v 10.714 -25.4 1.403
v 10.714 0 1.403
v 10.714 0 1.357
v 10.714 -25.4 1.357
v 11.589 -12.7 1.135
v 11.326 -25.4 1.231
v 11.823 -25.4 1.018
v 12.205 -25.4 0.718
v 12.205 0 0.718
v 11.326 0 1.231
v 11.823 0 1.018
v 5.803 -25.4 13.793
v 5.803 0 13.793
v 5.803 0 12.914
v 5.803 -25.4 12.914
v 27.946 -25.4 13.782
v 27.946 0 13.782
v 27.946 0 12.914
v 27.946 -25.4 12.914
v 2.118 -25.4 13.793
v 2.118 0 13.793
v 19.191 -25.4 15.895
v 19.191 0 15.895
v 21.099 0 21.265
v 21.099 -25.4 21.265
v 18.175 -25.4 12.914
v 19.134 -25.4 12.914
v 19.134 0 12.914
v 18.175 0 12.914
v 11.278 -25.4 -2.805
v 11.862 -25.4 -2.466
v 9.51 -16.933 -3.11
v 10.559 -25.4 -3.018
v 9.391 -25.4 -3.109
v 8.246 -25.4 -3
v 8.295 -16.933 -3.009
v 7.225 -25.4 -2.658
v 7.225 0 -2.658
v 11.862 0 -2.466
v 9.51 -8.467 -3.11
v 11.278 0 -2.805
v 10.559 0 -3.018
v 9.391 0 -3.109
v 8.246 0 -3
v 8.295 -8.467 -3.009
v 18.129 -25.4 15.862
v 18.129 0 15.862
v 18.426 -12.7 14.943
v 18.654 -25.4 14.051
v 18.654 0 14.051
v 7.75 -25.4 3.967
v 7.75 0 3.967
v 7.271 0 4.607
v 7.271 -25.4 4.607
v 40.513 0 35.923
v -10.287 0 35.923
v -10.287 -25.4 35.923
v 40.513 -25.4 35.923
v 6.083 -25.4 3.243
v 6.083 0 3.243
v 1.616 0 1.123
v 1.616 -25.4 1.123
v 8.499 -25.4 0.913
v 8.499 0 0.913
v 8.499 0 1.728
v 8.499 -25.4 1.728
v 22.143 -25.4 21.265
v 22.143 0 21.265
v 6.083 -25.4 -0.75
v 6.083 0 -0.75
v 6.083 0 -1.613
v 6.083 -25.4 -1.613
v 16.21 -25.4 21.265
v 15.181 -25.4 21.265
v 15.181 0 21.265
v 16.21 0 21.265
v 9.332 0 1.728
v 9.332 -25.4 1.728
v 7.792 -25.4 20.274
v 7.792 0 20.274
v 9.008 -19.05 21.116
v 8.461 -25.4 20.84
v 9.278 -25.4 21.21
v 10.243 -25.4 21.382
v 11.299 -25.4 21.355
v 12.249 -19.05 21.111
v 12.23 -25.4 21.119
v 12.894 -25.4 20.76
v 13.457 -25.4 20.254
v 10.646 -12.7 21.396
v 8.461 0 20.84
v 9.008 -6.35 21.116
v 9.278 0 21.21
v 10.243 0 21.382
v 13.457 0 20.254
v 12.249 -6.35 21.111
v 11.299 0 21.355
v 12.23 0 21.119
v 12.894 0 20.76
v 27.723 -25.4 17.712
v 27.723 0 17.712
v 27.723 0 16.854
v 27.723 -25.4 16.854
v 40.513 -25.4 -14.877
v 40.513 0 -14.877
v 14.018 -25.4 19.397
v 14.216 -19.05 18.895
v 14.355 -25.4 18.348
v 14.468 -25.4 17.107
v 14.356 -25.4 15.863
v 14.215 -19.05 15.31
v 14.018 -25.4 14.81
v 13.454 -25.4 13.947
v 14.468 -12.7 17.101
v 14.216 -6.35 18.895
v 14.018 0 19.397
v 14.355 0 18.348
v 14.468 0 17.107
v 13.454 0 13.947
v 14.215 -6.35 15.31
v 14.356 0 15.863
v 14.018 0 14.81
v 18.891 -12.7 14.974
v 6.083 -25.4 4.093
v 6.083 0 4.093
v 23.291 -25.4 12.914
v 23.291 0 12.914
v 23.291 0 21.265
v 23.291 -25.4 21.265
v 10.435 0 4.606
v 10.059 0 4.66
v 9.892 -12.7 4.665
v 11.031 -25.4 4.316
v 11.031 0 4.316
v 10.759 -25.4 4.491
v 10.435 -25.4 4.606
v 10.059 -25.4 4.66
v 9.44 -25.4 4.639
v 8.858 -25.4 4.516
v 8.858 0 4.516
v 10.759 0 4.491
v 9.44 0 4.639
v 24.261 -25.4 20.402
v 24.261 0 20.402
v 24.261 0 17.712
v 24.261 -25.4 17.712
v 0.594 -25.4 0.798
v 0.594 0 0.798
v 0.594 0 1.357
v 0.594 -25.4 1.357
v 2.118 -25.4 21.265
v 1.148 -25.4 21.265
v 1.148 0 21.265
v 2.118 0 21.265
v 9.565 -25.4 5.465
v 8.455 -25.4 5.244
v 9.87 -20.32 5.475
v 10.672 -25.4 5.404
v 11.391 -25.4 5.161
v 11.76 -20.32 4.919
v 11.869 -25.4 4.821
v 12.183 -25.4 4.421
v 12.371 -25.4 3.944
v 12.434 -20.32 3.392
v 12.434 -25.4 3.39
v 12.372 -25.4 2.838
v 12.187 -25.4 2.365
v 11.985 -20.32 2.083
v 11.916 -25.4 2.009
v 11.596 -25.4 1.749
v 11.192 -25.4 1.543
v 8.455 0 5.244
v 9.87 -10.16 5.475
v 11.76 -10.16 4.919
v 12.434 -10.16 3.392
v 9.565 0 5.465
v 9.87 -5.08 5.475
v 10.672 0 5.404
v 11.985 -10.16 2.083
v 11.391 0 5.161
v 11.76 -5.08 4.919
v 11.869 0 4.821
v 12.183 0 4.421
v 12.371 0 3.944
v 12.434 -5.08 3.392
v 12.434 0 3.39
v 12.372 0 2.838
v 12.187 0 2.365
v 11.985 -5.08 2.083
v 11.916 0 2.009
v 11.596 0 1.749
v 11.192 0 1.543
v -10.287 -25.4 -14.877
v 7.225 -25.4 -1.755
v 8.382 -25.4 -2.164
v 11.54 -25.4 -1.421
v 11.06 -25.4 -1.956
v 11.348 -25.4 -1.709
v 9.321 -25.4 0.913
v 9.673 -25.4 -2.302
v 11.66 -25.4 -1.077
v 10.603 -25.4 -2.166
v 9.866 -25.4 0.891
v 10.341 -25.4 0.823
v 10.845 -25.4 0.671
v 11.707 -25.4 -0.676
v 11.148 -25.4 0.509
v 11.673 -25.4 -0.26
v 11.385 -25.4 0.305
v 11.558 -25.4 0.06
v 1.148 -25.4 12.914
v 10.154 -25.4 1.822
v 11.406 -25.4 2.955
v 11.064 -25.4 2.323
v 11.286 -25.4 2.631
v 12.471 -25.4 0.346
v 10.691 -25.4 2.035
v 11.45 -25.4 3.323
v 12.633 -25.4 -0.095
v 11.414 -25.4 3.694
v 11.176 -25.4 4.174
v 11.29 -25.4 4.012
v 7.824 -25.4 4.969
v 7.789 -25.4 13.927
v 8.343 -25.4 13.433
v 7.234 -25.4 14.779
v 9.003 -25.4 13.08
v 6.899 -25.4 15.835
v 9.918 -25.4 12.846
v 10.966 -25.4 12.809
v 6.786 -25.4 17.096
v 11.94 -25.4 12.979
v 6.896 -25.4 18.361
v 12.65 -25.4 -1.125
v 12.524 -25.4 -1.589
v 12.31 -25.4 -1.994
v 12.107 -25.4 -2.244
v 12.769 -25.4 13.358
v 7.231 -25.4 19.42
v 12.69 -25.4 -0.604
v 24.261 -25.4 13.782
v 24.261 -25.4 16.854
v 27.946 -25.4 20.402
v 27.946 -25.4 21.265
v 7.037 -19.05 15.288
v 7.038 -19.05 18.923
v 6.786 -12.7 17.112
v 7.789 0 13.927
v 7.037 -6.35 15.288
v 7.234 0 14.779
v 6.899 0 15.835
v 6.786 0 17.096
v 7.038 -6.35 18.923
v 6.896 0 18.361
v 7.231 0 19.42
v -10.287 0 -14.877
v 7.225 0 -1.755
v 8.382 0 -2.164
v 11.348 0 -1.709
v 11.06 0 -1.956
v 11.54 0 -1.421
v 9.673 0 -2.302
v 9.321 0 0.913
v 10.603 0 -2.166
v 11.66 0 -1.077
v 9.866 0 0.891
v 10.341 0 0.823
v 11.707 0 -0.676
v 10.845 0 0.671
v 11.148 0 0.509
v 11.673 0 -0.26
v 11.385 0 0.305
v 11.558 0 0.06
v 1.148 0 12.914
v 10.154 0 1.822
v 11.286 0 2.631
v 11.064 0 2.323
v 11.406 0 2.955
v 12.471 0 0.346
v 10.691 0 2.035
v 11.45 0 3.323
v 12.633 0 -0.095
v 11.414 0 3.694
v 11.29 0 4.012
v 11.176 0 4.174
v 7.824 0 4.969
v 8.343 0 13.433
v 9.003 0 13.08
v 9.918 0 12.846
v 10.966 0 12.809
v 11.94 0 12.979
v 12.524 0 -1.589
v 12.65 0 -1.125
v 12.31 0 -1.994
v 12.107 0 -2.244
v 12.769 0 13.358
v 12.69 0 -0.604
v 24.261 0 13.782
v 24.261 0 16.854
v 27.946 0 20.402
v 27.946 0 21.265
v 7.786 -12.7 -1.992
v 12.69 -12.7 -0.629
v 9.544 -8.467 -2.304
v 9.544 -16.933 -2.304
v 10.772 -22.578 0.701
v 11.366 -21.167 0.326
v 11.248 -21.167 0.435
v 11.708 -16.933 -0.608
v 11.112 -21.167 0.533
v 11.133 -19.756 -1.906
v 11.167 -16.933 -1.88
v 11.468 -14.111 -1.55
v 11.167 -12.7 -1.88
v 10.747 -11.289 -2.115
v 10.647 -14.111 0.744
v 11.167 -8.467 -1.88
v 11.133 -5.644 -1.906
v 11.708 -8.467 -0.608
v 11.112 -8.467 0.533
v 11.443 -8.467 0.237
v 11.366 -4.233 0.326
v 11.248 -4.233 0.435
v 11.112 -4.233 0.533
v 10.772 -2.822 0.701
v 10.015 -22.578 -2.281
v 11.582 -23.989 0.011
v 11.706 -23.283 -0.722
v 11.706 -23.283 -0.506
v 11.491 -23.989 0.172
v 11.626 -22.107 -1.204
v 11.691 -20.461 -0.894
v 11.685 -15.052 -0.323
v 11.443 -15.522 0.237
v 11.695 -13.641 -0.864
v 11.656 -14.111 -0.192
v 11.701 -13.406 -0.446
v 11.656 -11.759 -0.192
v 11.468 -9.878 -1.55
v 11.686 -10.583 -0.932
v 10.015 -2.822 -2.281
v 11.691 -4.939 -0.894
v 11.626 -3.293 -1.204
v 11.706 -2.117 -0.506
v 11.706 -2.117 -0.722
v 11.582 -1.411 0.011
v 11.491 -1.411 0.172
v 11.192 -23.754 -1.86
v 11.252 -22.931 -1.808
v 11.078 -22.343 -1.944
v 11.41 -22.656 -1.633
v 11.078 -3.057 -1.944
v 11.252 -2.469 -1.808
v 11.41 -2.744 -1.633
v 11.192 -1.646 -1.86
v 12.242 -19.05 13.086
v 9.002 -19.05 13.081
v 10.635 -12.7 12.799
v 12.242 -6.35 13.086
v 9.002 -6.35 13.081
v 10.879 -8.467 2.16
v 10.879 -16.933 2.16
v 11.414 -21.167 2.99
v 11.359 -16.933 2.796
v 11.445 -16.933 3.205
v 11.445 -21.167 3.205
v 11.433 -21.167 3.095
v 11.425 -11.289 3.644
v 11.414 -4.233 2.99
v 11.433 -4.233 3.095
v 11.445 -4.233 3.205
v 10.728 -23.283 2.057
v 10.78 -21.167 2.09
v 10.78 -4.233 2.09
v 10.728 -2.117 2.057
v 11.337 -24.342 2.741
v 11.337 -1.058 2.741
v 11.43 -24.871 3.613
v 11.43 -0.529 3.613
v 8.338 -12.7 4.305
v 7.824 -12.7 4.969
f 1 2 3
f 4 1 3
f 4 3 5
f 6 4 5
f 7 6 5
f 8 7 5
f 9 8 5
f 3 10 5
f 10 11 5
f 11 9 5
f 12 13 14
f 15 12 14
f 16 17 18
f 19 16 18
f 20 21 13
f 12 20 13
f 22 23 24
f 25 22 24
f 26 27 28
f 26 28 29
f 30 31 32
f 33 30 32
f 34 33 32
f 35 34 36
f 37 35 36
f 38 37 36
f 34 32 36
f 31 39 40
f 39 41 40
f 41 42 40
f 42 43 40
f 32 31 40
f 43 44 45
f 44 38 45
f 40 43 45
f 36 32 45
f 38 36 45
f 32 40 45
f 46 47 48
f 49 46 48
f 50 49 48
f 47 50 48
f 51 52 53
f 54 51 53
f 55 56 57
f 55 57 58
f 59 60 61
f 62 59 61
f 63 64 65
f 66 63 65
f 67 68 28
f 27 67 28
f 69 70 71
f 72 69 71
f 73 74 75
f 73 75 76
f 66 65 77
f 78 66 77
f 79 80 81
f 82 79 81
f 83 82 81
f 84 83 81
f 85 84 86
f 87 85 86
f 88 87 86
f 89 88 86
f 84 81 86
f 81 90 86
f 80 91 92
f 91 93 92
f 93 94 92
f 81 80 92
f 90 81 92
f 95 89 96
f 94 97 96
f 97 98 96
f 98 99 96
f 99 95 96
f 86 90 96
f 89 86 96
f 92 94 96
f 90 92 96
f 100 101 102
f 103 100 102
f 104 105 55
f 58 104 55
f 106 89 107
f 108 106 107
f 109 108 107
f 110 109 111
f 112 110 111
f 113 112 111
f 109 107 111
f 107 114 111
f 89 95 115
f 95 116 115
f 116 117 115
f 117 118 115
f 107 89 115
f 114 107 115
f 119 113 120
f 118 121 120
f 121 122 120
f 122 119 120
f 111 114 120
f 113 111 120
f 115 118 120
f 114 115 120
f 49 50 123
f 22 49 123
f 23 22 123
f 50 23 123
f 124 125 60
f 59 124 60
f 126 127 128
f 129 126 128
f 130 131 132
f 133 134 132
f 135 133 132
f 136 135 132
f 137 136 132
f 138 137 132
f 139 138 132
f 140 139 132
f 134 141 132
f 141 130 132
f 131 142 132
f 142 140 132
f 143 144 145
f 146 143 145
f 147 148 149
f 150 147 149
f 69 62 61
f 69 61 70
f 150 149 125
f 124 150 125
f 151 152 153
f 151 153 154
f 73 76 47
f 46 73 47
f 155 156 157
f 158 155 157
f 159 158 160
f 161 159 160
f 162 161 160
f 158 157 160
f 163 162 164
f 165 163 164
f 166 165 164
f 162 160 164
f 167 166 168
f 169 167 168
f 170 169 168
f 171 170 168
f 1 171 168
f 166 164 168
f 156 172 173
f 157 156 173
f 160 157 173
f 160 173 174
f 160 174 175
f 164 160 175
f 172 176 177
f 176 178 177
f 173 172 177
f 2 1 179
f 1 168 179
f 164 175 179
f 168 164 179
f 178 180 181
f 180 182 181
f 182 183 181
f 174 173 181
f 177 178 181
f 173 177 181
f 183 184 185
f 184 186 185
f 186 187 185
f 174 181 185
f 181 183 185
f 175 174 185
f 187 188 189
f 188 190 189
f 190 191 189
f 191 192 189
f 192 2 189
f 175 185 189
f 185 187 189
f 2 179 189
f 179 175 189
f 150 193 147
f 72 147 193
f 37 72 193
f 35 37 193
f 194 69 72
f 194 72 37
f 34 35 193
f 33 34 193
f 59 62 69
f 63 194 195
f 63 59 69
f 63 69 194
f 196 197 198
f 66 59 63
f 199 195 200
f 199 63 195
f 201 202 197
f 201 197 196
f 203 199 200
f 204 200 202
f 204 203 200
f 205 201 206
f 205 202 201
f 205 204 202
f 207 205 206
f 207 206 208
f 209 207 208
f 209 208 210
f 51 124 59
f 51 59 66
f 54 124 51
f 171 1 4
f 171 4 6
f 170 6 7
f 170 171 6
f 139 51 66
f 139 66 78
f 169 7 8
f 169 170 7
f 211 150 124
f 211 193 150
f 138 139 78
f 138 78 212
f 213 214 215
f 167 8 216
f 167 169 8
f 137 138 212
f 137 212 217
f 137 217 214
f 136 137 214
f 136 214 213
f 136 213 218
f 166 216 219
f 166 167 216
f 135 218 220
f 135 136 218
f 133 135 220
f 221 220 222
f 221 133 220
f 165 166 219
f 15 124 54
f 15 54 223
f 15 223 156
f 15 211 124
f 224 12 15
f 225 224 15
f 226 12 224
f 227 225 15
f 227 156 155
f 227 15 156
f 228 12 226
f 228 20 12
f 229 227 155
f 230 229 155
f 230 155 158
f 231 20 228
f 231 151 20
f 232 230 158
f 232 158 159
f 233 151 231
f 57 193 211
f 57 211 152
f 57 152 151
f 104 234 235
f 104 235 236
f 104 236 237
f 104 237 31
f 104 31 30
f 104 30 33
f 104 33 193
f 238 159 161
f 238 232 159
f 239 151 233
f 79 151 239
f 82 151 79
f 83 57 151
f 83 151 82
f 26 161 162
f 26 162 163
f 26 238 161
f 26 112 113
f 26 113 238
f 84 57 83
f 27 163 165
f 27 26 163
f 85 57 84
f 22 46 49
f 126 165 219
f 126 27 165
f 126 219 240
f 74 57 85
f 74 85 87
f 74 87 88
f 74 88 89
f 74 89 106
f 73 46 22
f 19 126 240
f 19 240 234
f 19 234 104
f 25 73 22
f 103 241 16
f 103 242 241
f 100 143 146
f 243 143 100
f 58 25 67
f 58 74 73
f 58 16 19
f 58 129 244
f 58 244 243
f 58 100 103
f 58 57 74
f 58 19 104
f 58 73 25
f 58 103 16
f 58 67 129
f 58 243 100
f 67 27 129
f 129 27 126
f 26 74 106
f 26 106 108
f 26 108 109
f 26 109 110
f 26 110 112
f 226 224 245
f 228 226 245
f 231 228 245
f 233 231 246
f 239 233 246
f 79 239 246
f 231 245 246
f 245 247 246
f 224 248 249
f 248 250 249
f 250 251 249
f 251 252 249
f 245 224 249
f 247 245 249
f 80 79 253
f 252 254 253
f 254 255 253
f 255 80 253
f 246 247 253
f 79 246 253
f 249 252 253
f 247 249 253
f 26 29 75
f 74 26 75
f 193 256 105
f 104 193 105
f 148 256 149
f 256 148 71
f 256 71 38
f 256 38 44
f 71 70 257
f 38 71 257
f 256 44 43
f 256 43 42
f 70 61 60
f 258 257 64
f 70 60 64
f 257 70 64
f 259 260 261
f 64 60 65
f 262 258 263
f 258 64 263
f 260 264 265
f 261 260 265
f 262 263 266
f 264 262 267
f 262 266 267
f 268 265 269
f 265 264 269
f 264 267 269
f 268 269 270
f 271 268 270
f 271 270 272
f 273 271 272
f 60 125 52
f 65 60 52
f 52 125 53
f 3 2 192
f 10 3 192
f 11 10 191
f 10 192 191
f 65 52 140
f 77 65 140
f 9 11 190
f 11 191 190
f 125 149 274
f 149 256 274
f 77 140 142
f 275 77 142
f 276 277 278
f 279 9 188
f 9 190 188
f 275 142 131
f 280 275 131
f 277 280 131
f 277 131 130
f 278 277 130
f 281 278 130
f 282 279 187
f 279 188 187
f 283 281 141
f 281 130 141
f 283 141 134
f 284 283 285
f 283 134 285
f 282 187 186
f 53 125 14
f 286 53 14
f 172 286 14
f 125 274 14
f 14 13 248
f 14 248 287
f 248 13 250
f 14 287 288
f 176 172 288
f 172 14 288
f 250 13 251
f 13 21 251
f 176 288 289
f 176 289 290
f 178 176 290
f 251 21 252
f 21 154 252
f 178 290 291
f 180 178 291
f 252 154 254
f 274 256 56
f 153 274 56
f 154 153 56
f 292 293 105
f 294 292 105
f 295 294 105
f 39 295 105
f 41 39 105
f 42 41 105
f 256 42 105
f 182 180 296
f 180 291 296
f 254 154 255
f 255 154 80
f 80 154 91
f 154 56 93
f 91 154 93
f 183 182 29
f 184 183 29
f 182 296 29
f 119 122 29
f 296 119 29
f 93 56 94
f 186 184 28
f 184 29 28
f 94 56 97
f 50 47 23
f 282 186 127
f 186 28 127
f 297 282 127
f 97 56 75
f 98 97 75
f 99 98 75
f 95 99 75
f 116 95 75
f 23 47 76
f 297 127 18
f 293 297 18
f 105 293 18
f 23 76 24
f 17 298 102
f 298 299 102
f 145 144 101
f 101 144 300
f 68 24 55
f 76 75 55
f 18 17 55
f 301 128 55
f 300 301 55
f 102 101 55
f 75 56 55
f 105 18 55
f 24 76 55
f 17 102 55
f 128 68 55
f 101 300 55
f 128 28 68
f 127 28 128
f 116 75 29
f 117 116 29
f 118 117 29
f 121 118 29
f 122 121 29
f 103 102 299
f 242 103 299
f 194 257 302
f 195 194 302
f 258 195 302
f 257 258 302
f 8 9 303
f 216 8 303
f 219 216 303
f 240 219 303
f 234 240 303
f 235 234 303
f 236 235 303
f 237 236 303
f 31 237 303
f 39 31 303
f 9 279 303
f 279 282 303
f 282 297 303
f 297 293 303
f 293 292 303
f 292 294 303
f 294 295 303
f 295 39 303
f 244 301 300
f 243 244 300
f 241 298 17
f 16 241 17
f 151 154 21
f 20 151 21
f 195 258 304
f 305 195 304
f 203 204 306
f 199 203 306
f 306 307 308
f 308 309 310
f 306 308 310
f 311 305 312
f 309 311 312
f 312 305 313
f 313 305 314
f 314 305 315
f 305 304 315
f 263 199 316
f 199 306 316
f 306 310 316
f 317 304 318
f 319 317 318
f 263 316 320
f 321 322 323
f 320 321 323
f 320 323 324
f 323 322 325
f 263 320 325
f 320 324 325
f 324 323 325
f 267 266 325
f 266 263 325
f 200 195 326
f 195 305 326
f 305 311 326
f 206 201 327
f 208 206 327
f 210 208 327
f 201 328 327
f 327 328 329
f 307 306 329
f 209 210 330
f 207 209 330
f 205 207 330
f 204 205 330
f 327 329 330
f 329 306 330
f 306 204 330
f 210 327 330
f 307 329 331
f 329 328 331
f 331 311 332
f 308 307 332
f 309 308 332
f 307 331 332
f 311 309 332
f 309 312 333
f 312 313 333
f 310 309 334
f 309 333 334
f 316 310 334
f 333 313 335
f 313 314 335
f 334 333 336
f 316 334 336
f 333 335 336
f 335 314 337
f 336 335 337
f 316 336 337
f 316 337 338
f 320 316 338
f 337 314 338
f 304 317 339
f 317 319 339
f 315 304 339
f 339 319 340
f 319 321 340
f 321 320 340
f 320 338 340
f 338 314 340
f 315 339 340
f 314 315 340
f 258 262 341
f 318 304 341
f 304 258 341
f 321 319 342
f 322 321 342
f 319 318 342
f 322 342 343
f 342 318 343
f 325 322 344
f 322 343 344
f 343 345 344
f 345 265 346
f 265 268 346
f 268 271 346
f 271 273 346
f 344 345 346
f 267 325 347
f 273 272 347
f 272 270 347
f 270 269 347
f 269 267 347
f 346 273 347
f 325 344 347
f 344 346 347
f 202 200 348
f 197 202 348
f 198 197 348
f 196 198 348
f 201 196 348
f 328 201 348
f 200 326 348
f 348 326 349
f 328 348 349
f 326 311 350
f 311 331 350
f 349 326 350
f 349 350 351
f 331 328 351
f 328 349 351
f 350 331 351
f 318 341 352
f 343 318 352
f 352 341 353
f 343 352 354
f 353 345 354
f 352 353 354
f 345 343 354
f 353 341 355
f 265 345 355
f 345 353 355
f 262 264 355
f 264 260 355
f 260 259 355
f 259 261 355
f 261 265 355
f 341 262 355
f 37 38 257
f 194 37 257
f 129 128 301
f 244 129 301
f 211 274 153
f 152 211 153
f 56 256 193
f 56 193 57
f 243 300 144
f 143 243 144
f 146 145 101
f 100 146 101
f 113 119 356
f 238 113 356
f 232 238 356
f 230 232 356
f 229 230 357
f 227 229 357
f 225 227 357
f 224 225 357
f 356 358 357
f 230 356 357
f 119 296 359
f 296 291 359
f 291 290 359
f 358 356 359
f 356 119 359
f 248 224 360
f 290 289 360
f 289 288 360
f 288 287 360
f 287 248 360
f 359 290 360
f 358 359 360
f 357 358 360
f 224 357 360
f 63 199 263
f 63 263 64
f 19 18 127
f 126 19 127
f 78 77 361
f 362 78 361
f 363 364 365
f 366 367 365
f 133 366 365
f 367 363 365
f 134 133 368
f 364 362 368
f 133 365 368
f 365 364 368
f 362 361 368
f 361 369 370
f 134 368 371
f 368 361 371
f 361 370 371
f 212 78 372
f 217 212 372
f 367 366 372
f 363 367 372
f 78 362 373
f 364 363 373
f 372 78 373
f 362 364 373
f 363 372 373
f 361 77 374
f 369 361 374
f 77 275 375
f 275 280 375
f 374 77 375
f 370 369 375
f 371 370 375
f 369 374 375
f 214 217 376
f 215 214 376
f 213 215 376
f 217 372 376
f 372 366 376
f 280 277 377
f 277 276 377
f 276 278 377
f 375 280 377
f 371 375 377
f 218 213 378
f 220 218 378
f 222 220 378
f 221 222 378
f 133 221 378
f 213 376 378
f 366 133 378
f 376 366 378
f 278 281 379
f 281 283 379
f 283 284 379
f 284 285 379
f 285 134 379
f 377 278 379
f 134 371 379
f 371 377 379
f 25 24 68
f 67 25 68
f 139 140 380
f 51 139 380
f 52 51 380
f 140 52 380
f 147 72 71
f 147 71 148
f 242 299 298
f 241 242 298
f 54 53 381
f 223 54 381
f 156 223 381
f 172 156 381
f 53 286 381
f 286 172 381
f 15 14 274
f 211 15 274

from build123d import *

# Parameters (mm, degrees)
F0_W     = 50.8
F0_H     = 50.8
F1_DEPTH = 25.4


with BuildPart() as f1:
    # F0 (on Front) → F1 (new body)
    with BuildSketch(Plane.XZ):
        with Locations((15.1133043692, 10.5228427142)):
            Rectangle(F0_W, F0_H)
        Polygon((6.0826331481, -0.7500971721), (6.0826331481, -1.6127783157), (0.5940071434, 0.7979768292), (0.5940071434, 1.3572574011), (6.0826331481, 4.0933456892), (6.0826331481, 3.2434585456), (1.61569943, 1.1233099724), align=None, mode=Mode.SUBTRACT)
        with BuildLine():
            add(Edge.make_bspline(
                [(11.7595137243, 4.9185586899), (12.4339402963, 4.3620196894), (12.4339402963, 3.3915034029)],
                knots=[0, 0, 0, 1, 1, 1], degree=2))
            add(Edge.make_bspline(
                [(12.4339402963, 3.3915034029), (12.4339402963, 2.5909645451), (11.9852364388, 2.0828599732)],
                knots=[0, 0, 0, 1, 1, 1], degree=2))
            add(Edge.make_bspline(
                [(11.9852364388, 2.0828599732), (11.5365325813, 1.5747554013), (10.714061152, 1.4029502583)],
                knots=[0, 0, 0, 1, 1, 1], degree=2))
            Line((10.714061152, 1.4029502583), (10.714061152, 1.3572574011))
            add(Edge.make_bspline(
                [(10.714061152, 1.3572574011), (11.71930401, 1.2329728296), (12.2045621533, 0.7184712577)],
                knots=[0, 0, 0, 1, 1, 1], degree=2))
            add(Edge.make_bspline(
                [(12.2045621533, 0.7184712577), (12.6898202965, 0.2039696859), (12.6898202965, -0.6294680291)],
                knots=[0, 0, 0, 1, 1, 1], degree=2))
            add(Edge.make_bspline(
                [(12.6898202965, -0.6294680291), (12.6898202965, -1.8229654587), (11.8618657244, -2.4663208878)],
                knots=[0, 0, 0, 1, 1, 1], degree=2))
            add(Edge.make_bspline(
                [(11.8618657244, -2.4663208878), (11.0339111523, -3.109676317), (9.5095974367, -3.109676317)],
                knots=[0, 0, 0, 1, 1, 1], degree=2))
            add(Edge.make_bspline(
                [(9.5095974367, -3.109676317), (8.8461371504, -3.109676317), (8.2950812928, -3.0091520312)],
                knots=[0, 0, 0, 1, 1, 1], degree=2))
            add(Edge.make_bspline(
                [(8.2950812928, -3.0091520312), (7.7440254352, -2.9086277454), (7.2249545776, -2.658230888)],
                knots=[0, 0, 0, 1, 1, 1], degree=2))
            Line((7.2249545776, -2.658230888), (7.2249545776, -1.7553400301))
            add(Edge.make_bspline(
                [(7.2249545776, -1.7553400301), (7.7677857209, -2.0240140303), (8.3818977214, -2.1638341733)],
                knots=[0, 0, 0, 1, 1, 1], degree=2))
            add(Edge.make_bspline(
                [(8.3818977214, -2.1638341733), (8.996009722, -2.3036543163), (9.5443240081, -2.3036543163)],
                knots=[0, 0, 0, 1, 1, 1], degree=2))
            add(Edge.make_bspline(
                [(9.5443240081, -2.3036543163), (11.7083377243, -2.3036543163), (11.7083377243, -0.6075354577)],
                knots=[0, 0, 0, 1, 1, 1], degree=2))
            add(Edge.make_bspline(
                [(11.7083377243, -0.6075354577), (11.7083377243, 0.9131228293), (9.3213428651, 0.9131228293)],
                knots=[0, 0, 0, 1, 1, 1], degree=2))
            Line((9.3213428651, 0.9131228293), (8.4988714358, 0.9131228293))
            Line((8.4988714358, 0.9131228293), (8.4988714358, 1.7282834015))
            Line((8.4988714358, 1.7282834015), (9.3323091508, 1.7282834015))
            add(Edge.make_bspline(
                [(9.3323091508, 1.7282834015), (10.3083085802, 1.7282834015), (10.879469295, 2.1596239733)],
                knots=[0, 0, 0, 1, 1, 1], degree=2))
            add(Edge.make_bspline(
                [(10.879469295, 2.1596239733), (11.4506300098, 2.5909645451), (11.4506300098, 3.3567768314)],
                knots=[0, 0, 0, 1, 1, 1], degree=2))
            add(Edge.make_bspline(
                [(11.4506300098, 3.3567768314), (11.4506300098, 3.9672334034), (11.0311695808, 4.3163268322)],
                knots=[0, 0, 0, 1, 1, 1], degree=2))
            add(Edge.make_bspline(
                [(11.0311695808, 4.3163268322), (10.6117091519, 4.6654202611), (9.8915897227, 4.6654202611)],
                knots=[0, 0, 0, 1, 1, 1], degree=2))
            add(Edge.make_bspline(
                [(9.8915897227, 4.6654202611), (9.3432754365, 4.6654202611), (8.8580172933, 4.5164615467)],
                knots=[0, 0, 0, 1, 1, 1], degree=2))
            add(Edge.make_bspline(
                [(8.8580172933, 4.5164615467), (8.37275915, 4.3675028323), (7.749508578, 3.9672334034)],
                knots=[0, 0, 0, 1, 1, 1], degree=2))
            Line((7.749508578, 3.9672334034), (7.2706474348, 4.6069334039))
            add(Edge.make_bspline(
                [(7.2706474348, 4.6069334039), (7.7842351495, 5.0126859757), (8.4550062929, 5.243891833)],
                knots=[0, 0, 0, 1, 1, 1], degree=2))
            add(Edge.make_bspline(
                [(8.4550062929, 5.243891833), (9.1257774364, 5.4750976904), (9.8696571513, 5.4750976904)],
                knots=[0, 0, 0, 1, 1, 1], degree=2))
            add(Edge.make_bspline(
                [(9.8696571513, 5.4750976904), (11.0850871523, 5.4750976904), (11.7595137243, 4.9185586899)],
                knots=[0, 0, 0, 1, 1, 1], degree=2))
        make_face(mode=Mode.SUBTRACT)
        Polygon((5.8029928621, 12.9138948396), (1.1478045724, 12.9138948396), (1.1478045724, 21.2647214181), (2.118320859, 21.2647214181), (2.118320859, 13.7930254118), (5.8029928621, 13.7930254118), align=None, mode=Mode.SUBTRACT)
        with BuildLine():
            add(Edge.make_bspline(
                [(13.4574602972, 20.2539954173), (14.4681862981, 19.1116739877), (14.4681862981, 17.1011882717)],
                knots=[0, 0, 0, 1, 1, 1], degree=2))
            add(Edge.make_bspline(
                [(14.4681862981, 17.1011882717), (14.4681862981, 15.0961856986), (13.4538048686, 13.947467269)],
                knots=[0, 0, 0, 1, 1, 1], degree=2))
            add(Edge.make_bspline(
                [(13.4538048686, 13.947467269), (12.4394234392, 12.7987488395), (10.6354694377, 12.7987488395)],
                knots=[0, 0, 0, 1, 1, 1], degree=2))
            add(Edge.make_bspline(
                [(10.6354694377, 12.7987488395), (8.7913057218, 12.7987488395), (7.7888044352, 13.9273624119)],
                knots=[0, 0, 0, 1, 1, 1], degree=2))
            add(Edge.make_bspline(
                [(7.7888044352, 13.9273624119), (6.7863031487, 15.0559759843), (6.7863031487, 17.1121545575)],
                knots=[0, 0, 0, 1, 1, 1], degree=2))
            add(Edge.make_bspline(
                [(6.7863031487, 17.1121545575), (6.7863031487, 19.1518837021), (7.7915460067, 20.2741002744)],
                knots=[0, 0, 0, 1, 1, 1], degree=2))
            add(Edge.make_bspline(
                [(7.7915460067, 20.2741002744), (8.7967888647, 21.3963168468), (10.6464357234, 21.3963168468)],
                knots=[0, 0, 0, 1, 1, 1], degree=2))
            add(Edge.make_bspline(
                [(10.6464357234, 21.3963168468), (12.4467342963, 21.3963168468), (13.4574602972, 20.2539954173)],
                knots=[0, 0, 0, 1, 1, 1], degree=2))
        make_face(mode=Mode.SUBTRACT)
        with BuildLine():
            Line((19.1910000164, 15.8948968421), (21.0991337323, 21.2647214181))
            Line((21.0991337323, 21.2647214181), (22.1427585903, 21.2647214181))
            Line((22.1427585903, 21.2647214181), (19.1343408735, 12.9138948396))
            Line((19.1343408735, 12.9138948396), (18.1747908727, 12.9138948396))
            Line((18.1747908727, 12.9138948396), (15.1809948701, 21.2647214181))
            Line((15.1809948701, 21.2647214181), (16.2099980138, 21.2647214181))
            Line((16.2099980138, 21.2647214181), (18.1290980155, 15.861997985))
            add(Edge.make_bspline(
                [(18.1290980155, 15.861997985), (18.4599143015, 14.9298636984), (18.6536520159, 14.0507331263)],
                knots=[0, 0, 0, 1, 1, 1], degree=2))
            add(Edge.make_bspline(
                [(18.6536520159, 14.0507331263), (18.8601837304, 14.9755565556), (19.1910000164, 15.8948968421)],
                knots=[0, 0, 0, 1, 1, 1], degree=2))
        make_face(mode=Mode.SUBTRACT)
        Polygon((27.9457514524, 13.782059126), (27.9457514524, 12.9138948396), (23.2905631627, 12.9138948396), (23.2905631627, 21.2647214181), (27.9457514524, 21.2647214181), (27.9457514524, 20.4020402746), (24.2610794493, 20.4020402746), (24.2610794493, 17.7116448437), (27.7227703094, 17.7116448437), (27.7227703094, 16.8544468429), (24.2610794493, 16.8544468429), (24.2610794493, 13.782059126), align=None, mode=Mode.SUBTRACT)
    extrude(amount=F1_DEPTH)


solid = f1.part
